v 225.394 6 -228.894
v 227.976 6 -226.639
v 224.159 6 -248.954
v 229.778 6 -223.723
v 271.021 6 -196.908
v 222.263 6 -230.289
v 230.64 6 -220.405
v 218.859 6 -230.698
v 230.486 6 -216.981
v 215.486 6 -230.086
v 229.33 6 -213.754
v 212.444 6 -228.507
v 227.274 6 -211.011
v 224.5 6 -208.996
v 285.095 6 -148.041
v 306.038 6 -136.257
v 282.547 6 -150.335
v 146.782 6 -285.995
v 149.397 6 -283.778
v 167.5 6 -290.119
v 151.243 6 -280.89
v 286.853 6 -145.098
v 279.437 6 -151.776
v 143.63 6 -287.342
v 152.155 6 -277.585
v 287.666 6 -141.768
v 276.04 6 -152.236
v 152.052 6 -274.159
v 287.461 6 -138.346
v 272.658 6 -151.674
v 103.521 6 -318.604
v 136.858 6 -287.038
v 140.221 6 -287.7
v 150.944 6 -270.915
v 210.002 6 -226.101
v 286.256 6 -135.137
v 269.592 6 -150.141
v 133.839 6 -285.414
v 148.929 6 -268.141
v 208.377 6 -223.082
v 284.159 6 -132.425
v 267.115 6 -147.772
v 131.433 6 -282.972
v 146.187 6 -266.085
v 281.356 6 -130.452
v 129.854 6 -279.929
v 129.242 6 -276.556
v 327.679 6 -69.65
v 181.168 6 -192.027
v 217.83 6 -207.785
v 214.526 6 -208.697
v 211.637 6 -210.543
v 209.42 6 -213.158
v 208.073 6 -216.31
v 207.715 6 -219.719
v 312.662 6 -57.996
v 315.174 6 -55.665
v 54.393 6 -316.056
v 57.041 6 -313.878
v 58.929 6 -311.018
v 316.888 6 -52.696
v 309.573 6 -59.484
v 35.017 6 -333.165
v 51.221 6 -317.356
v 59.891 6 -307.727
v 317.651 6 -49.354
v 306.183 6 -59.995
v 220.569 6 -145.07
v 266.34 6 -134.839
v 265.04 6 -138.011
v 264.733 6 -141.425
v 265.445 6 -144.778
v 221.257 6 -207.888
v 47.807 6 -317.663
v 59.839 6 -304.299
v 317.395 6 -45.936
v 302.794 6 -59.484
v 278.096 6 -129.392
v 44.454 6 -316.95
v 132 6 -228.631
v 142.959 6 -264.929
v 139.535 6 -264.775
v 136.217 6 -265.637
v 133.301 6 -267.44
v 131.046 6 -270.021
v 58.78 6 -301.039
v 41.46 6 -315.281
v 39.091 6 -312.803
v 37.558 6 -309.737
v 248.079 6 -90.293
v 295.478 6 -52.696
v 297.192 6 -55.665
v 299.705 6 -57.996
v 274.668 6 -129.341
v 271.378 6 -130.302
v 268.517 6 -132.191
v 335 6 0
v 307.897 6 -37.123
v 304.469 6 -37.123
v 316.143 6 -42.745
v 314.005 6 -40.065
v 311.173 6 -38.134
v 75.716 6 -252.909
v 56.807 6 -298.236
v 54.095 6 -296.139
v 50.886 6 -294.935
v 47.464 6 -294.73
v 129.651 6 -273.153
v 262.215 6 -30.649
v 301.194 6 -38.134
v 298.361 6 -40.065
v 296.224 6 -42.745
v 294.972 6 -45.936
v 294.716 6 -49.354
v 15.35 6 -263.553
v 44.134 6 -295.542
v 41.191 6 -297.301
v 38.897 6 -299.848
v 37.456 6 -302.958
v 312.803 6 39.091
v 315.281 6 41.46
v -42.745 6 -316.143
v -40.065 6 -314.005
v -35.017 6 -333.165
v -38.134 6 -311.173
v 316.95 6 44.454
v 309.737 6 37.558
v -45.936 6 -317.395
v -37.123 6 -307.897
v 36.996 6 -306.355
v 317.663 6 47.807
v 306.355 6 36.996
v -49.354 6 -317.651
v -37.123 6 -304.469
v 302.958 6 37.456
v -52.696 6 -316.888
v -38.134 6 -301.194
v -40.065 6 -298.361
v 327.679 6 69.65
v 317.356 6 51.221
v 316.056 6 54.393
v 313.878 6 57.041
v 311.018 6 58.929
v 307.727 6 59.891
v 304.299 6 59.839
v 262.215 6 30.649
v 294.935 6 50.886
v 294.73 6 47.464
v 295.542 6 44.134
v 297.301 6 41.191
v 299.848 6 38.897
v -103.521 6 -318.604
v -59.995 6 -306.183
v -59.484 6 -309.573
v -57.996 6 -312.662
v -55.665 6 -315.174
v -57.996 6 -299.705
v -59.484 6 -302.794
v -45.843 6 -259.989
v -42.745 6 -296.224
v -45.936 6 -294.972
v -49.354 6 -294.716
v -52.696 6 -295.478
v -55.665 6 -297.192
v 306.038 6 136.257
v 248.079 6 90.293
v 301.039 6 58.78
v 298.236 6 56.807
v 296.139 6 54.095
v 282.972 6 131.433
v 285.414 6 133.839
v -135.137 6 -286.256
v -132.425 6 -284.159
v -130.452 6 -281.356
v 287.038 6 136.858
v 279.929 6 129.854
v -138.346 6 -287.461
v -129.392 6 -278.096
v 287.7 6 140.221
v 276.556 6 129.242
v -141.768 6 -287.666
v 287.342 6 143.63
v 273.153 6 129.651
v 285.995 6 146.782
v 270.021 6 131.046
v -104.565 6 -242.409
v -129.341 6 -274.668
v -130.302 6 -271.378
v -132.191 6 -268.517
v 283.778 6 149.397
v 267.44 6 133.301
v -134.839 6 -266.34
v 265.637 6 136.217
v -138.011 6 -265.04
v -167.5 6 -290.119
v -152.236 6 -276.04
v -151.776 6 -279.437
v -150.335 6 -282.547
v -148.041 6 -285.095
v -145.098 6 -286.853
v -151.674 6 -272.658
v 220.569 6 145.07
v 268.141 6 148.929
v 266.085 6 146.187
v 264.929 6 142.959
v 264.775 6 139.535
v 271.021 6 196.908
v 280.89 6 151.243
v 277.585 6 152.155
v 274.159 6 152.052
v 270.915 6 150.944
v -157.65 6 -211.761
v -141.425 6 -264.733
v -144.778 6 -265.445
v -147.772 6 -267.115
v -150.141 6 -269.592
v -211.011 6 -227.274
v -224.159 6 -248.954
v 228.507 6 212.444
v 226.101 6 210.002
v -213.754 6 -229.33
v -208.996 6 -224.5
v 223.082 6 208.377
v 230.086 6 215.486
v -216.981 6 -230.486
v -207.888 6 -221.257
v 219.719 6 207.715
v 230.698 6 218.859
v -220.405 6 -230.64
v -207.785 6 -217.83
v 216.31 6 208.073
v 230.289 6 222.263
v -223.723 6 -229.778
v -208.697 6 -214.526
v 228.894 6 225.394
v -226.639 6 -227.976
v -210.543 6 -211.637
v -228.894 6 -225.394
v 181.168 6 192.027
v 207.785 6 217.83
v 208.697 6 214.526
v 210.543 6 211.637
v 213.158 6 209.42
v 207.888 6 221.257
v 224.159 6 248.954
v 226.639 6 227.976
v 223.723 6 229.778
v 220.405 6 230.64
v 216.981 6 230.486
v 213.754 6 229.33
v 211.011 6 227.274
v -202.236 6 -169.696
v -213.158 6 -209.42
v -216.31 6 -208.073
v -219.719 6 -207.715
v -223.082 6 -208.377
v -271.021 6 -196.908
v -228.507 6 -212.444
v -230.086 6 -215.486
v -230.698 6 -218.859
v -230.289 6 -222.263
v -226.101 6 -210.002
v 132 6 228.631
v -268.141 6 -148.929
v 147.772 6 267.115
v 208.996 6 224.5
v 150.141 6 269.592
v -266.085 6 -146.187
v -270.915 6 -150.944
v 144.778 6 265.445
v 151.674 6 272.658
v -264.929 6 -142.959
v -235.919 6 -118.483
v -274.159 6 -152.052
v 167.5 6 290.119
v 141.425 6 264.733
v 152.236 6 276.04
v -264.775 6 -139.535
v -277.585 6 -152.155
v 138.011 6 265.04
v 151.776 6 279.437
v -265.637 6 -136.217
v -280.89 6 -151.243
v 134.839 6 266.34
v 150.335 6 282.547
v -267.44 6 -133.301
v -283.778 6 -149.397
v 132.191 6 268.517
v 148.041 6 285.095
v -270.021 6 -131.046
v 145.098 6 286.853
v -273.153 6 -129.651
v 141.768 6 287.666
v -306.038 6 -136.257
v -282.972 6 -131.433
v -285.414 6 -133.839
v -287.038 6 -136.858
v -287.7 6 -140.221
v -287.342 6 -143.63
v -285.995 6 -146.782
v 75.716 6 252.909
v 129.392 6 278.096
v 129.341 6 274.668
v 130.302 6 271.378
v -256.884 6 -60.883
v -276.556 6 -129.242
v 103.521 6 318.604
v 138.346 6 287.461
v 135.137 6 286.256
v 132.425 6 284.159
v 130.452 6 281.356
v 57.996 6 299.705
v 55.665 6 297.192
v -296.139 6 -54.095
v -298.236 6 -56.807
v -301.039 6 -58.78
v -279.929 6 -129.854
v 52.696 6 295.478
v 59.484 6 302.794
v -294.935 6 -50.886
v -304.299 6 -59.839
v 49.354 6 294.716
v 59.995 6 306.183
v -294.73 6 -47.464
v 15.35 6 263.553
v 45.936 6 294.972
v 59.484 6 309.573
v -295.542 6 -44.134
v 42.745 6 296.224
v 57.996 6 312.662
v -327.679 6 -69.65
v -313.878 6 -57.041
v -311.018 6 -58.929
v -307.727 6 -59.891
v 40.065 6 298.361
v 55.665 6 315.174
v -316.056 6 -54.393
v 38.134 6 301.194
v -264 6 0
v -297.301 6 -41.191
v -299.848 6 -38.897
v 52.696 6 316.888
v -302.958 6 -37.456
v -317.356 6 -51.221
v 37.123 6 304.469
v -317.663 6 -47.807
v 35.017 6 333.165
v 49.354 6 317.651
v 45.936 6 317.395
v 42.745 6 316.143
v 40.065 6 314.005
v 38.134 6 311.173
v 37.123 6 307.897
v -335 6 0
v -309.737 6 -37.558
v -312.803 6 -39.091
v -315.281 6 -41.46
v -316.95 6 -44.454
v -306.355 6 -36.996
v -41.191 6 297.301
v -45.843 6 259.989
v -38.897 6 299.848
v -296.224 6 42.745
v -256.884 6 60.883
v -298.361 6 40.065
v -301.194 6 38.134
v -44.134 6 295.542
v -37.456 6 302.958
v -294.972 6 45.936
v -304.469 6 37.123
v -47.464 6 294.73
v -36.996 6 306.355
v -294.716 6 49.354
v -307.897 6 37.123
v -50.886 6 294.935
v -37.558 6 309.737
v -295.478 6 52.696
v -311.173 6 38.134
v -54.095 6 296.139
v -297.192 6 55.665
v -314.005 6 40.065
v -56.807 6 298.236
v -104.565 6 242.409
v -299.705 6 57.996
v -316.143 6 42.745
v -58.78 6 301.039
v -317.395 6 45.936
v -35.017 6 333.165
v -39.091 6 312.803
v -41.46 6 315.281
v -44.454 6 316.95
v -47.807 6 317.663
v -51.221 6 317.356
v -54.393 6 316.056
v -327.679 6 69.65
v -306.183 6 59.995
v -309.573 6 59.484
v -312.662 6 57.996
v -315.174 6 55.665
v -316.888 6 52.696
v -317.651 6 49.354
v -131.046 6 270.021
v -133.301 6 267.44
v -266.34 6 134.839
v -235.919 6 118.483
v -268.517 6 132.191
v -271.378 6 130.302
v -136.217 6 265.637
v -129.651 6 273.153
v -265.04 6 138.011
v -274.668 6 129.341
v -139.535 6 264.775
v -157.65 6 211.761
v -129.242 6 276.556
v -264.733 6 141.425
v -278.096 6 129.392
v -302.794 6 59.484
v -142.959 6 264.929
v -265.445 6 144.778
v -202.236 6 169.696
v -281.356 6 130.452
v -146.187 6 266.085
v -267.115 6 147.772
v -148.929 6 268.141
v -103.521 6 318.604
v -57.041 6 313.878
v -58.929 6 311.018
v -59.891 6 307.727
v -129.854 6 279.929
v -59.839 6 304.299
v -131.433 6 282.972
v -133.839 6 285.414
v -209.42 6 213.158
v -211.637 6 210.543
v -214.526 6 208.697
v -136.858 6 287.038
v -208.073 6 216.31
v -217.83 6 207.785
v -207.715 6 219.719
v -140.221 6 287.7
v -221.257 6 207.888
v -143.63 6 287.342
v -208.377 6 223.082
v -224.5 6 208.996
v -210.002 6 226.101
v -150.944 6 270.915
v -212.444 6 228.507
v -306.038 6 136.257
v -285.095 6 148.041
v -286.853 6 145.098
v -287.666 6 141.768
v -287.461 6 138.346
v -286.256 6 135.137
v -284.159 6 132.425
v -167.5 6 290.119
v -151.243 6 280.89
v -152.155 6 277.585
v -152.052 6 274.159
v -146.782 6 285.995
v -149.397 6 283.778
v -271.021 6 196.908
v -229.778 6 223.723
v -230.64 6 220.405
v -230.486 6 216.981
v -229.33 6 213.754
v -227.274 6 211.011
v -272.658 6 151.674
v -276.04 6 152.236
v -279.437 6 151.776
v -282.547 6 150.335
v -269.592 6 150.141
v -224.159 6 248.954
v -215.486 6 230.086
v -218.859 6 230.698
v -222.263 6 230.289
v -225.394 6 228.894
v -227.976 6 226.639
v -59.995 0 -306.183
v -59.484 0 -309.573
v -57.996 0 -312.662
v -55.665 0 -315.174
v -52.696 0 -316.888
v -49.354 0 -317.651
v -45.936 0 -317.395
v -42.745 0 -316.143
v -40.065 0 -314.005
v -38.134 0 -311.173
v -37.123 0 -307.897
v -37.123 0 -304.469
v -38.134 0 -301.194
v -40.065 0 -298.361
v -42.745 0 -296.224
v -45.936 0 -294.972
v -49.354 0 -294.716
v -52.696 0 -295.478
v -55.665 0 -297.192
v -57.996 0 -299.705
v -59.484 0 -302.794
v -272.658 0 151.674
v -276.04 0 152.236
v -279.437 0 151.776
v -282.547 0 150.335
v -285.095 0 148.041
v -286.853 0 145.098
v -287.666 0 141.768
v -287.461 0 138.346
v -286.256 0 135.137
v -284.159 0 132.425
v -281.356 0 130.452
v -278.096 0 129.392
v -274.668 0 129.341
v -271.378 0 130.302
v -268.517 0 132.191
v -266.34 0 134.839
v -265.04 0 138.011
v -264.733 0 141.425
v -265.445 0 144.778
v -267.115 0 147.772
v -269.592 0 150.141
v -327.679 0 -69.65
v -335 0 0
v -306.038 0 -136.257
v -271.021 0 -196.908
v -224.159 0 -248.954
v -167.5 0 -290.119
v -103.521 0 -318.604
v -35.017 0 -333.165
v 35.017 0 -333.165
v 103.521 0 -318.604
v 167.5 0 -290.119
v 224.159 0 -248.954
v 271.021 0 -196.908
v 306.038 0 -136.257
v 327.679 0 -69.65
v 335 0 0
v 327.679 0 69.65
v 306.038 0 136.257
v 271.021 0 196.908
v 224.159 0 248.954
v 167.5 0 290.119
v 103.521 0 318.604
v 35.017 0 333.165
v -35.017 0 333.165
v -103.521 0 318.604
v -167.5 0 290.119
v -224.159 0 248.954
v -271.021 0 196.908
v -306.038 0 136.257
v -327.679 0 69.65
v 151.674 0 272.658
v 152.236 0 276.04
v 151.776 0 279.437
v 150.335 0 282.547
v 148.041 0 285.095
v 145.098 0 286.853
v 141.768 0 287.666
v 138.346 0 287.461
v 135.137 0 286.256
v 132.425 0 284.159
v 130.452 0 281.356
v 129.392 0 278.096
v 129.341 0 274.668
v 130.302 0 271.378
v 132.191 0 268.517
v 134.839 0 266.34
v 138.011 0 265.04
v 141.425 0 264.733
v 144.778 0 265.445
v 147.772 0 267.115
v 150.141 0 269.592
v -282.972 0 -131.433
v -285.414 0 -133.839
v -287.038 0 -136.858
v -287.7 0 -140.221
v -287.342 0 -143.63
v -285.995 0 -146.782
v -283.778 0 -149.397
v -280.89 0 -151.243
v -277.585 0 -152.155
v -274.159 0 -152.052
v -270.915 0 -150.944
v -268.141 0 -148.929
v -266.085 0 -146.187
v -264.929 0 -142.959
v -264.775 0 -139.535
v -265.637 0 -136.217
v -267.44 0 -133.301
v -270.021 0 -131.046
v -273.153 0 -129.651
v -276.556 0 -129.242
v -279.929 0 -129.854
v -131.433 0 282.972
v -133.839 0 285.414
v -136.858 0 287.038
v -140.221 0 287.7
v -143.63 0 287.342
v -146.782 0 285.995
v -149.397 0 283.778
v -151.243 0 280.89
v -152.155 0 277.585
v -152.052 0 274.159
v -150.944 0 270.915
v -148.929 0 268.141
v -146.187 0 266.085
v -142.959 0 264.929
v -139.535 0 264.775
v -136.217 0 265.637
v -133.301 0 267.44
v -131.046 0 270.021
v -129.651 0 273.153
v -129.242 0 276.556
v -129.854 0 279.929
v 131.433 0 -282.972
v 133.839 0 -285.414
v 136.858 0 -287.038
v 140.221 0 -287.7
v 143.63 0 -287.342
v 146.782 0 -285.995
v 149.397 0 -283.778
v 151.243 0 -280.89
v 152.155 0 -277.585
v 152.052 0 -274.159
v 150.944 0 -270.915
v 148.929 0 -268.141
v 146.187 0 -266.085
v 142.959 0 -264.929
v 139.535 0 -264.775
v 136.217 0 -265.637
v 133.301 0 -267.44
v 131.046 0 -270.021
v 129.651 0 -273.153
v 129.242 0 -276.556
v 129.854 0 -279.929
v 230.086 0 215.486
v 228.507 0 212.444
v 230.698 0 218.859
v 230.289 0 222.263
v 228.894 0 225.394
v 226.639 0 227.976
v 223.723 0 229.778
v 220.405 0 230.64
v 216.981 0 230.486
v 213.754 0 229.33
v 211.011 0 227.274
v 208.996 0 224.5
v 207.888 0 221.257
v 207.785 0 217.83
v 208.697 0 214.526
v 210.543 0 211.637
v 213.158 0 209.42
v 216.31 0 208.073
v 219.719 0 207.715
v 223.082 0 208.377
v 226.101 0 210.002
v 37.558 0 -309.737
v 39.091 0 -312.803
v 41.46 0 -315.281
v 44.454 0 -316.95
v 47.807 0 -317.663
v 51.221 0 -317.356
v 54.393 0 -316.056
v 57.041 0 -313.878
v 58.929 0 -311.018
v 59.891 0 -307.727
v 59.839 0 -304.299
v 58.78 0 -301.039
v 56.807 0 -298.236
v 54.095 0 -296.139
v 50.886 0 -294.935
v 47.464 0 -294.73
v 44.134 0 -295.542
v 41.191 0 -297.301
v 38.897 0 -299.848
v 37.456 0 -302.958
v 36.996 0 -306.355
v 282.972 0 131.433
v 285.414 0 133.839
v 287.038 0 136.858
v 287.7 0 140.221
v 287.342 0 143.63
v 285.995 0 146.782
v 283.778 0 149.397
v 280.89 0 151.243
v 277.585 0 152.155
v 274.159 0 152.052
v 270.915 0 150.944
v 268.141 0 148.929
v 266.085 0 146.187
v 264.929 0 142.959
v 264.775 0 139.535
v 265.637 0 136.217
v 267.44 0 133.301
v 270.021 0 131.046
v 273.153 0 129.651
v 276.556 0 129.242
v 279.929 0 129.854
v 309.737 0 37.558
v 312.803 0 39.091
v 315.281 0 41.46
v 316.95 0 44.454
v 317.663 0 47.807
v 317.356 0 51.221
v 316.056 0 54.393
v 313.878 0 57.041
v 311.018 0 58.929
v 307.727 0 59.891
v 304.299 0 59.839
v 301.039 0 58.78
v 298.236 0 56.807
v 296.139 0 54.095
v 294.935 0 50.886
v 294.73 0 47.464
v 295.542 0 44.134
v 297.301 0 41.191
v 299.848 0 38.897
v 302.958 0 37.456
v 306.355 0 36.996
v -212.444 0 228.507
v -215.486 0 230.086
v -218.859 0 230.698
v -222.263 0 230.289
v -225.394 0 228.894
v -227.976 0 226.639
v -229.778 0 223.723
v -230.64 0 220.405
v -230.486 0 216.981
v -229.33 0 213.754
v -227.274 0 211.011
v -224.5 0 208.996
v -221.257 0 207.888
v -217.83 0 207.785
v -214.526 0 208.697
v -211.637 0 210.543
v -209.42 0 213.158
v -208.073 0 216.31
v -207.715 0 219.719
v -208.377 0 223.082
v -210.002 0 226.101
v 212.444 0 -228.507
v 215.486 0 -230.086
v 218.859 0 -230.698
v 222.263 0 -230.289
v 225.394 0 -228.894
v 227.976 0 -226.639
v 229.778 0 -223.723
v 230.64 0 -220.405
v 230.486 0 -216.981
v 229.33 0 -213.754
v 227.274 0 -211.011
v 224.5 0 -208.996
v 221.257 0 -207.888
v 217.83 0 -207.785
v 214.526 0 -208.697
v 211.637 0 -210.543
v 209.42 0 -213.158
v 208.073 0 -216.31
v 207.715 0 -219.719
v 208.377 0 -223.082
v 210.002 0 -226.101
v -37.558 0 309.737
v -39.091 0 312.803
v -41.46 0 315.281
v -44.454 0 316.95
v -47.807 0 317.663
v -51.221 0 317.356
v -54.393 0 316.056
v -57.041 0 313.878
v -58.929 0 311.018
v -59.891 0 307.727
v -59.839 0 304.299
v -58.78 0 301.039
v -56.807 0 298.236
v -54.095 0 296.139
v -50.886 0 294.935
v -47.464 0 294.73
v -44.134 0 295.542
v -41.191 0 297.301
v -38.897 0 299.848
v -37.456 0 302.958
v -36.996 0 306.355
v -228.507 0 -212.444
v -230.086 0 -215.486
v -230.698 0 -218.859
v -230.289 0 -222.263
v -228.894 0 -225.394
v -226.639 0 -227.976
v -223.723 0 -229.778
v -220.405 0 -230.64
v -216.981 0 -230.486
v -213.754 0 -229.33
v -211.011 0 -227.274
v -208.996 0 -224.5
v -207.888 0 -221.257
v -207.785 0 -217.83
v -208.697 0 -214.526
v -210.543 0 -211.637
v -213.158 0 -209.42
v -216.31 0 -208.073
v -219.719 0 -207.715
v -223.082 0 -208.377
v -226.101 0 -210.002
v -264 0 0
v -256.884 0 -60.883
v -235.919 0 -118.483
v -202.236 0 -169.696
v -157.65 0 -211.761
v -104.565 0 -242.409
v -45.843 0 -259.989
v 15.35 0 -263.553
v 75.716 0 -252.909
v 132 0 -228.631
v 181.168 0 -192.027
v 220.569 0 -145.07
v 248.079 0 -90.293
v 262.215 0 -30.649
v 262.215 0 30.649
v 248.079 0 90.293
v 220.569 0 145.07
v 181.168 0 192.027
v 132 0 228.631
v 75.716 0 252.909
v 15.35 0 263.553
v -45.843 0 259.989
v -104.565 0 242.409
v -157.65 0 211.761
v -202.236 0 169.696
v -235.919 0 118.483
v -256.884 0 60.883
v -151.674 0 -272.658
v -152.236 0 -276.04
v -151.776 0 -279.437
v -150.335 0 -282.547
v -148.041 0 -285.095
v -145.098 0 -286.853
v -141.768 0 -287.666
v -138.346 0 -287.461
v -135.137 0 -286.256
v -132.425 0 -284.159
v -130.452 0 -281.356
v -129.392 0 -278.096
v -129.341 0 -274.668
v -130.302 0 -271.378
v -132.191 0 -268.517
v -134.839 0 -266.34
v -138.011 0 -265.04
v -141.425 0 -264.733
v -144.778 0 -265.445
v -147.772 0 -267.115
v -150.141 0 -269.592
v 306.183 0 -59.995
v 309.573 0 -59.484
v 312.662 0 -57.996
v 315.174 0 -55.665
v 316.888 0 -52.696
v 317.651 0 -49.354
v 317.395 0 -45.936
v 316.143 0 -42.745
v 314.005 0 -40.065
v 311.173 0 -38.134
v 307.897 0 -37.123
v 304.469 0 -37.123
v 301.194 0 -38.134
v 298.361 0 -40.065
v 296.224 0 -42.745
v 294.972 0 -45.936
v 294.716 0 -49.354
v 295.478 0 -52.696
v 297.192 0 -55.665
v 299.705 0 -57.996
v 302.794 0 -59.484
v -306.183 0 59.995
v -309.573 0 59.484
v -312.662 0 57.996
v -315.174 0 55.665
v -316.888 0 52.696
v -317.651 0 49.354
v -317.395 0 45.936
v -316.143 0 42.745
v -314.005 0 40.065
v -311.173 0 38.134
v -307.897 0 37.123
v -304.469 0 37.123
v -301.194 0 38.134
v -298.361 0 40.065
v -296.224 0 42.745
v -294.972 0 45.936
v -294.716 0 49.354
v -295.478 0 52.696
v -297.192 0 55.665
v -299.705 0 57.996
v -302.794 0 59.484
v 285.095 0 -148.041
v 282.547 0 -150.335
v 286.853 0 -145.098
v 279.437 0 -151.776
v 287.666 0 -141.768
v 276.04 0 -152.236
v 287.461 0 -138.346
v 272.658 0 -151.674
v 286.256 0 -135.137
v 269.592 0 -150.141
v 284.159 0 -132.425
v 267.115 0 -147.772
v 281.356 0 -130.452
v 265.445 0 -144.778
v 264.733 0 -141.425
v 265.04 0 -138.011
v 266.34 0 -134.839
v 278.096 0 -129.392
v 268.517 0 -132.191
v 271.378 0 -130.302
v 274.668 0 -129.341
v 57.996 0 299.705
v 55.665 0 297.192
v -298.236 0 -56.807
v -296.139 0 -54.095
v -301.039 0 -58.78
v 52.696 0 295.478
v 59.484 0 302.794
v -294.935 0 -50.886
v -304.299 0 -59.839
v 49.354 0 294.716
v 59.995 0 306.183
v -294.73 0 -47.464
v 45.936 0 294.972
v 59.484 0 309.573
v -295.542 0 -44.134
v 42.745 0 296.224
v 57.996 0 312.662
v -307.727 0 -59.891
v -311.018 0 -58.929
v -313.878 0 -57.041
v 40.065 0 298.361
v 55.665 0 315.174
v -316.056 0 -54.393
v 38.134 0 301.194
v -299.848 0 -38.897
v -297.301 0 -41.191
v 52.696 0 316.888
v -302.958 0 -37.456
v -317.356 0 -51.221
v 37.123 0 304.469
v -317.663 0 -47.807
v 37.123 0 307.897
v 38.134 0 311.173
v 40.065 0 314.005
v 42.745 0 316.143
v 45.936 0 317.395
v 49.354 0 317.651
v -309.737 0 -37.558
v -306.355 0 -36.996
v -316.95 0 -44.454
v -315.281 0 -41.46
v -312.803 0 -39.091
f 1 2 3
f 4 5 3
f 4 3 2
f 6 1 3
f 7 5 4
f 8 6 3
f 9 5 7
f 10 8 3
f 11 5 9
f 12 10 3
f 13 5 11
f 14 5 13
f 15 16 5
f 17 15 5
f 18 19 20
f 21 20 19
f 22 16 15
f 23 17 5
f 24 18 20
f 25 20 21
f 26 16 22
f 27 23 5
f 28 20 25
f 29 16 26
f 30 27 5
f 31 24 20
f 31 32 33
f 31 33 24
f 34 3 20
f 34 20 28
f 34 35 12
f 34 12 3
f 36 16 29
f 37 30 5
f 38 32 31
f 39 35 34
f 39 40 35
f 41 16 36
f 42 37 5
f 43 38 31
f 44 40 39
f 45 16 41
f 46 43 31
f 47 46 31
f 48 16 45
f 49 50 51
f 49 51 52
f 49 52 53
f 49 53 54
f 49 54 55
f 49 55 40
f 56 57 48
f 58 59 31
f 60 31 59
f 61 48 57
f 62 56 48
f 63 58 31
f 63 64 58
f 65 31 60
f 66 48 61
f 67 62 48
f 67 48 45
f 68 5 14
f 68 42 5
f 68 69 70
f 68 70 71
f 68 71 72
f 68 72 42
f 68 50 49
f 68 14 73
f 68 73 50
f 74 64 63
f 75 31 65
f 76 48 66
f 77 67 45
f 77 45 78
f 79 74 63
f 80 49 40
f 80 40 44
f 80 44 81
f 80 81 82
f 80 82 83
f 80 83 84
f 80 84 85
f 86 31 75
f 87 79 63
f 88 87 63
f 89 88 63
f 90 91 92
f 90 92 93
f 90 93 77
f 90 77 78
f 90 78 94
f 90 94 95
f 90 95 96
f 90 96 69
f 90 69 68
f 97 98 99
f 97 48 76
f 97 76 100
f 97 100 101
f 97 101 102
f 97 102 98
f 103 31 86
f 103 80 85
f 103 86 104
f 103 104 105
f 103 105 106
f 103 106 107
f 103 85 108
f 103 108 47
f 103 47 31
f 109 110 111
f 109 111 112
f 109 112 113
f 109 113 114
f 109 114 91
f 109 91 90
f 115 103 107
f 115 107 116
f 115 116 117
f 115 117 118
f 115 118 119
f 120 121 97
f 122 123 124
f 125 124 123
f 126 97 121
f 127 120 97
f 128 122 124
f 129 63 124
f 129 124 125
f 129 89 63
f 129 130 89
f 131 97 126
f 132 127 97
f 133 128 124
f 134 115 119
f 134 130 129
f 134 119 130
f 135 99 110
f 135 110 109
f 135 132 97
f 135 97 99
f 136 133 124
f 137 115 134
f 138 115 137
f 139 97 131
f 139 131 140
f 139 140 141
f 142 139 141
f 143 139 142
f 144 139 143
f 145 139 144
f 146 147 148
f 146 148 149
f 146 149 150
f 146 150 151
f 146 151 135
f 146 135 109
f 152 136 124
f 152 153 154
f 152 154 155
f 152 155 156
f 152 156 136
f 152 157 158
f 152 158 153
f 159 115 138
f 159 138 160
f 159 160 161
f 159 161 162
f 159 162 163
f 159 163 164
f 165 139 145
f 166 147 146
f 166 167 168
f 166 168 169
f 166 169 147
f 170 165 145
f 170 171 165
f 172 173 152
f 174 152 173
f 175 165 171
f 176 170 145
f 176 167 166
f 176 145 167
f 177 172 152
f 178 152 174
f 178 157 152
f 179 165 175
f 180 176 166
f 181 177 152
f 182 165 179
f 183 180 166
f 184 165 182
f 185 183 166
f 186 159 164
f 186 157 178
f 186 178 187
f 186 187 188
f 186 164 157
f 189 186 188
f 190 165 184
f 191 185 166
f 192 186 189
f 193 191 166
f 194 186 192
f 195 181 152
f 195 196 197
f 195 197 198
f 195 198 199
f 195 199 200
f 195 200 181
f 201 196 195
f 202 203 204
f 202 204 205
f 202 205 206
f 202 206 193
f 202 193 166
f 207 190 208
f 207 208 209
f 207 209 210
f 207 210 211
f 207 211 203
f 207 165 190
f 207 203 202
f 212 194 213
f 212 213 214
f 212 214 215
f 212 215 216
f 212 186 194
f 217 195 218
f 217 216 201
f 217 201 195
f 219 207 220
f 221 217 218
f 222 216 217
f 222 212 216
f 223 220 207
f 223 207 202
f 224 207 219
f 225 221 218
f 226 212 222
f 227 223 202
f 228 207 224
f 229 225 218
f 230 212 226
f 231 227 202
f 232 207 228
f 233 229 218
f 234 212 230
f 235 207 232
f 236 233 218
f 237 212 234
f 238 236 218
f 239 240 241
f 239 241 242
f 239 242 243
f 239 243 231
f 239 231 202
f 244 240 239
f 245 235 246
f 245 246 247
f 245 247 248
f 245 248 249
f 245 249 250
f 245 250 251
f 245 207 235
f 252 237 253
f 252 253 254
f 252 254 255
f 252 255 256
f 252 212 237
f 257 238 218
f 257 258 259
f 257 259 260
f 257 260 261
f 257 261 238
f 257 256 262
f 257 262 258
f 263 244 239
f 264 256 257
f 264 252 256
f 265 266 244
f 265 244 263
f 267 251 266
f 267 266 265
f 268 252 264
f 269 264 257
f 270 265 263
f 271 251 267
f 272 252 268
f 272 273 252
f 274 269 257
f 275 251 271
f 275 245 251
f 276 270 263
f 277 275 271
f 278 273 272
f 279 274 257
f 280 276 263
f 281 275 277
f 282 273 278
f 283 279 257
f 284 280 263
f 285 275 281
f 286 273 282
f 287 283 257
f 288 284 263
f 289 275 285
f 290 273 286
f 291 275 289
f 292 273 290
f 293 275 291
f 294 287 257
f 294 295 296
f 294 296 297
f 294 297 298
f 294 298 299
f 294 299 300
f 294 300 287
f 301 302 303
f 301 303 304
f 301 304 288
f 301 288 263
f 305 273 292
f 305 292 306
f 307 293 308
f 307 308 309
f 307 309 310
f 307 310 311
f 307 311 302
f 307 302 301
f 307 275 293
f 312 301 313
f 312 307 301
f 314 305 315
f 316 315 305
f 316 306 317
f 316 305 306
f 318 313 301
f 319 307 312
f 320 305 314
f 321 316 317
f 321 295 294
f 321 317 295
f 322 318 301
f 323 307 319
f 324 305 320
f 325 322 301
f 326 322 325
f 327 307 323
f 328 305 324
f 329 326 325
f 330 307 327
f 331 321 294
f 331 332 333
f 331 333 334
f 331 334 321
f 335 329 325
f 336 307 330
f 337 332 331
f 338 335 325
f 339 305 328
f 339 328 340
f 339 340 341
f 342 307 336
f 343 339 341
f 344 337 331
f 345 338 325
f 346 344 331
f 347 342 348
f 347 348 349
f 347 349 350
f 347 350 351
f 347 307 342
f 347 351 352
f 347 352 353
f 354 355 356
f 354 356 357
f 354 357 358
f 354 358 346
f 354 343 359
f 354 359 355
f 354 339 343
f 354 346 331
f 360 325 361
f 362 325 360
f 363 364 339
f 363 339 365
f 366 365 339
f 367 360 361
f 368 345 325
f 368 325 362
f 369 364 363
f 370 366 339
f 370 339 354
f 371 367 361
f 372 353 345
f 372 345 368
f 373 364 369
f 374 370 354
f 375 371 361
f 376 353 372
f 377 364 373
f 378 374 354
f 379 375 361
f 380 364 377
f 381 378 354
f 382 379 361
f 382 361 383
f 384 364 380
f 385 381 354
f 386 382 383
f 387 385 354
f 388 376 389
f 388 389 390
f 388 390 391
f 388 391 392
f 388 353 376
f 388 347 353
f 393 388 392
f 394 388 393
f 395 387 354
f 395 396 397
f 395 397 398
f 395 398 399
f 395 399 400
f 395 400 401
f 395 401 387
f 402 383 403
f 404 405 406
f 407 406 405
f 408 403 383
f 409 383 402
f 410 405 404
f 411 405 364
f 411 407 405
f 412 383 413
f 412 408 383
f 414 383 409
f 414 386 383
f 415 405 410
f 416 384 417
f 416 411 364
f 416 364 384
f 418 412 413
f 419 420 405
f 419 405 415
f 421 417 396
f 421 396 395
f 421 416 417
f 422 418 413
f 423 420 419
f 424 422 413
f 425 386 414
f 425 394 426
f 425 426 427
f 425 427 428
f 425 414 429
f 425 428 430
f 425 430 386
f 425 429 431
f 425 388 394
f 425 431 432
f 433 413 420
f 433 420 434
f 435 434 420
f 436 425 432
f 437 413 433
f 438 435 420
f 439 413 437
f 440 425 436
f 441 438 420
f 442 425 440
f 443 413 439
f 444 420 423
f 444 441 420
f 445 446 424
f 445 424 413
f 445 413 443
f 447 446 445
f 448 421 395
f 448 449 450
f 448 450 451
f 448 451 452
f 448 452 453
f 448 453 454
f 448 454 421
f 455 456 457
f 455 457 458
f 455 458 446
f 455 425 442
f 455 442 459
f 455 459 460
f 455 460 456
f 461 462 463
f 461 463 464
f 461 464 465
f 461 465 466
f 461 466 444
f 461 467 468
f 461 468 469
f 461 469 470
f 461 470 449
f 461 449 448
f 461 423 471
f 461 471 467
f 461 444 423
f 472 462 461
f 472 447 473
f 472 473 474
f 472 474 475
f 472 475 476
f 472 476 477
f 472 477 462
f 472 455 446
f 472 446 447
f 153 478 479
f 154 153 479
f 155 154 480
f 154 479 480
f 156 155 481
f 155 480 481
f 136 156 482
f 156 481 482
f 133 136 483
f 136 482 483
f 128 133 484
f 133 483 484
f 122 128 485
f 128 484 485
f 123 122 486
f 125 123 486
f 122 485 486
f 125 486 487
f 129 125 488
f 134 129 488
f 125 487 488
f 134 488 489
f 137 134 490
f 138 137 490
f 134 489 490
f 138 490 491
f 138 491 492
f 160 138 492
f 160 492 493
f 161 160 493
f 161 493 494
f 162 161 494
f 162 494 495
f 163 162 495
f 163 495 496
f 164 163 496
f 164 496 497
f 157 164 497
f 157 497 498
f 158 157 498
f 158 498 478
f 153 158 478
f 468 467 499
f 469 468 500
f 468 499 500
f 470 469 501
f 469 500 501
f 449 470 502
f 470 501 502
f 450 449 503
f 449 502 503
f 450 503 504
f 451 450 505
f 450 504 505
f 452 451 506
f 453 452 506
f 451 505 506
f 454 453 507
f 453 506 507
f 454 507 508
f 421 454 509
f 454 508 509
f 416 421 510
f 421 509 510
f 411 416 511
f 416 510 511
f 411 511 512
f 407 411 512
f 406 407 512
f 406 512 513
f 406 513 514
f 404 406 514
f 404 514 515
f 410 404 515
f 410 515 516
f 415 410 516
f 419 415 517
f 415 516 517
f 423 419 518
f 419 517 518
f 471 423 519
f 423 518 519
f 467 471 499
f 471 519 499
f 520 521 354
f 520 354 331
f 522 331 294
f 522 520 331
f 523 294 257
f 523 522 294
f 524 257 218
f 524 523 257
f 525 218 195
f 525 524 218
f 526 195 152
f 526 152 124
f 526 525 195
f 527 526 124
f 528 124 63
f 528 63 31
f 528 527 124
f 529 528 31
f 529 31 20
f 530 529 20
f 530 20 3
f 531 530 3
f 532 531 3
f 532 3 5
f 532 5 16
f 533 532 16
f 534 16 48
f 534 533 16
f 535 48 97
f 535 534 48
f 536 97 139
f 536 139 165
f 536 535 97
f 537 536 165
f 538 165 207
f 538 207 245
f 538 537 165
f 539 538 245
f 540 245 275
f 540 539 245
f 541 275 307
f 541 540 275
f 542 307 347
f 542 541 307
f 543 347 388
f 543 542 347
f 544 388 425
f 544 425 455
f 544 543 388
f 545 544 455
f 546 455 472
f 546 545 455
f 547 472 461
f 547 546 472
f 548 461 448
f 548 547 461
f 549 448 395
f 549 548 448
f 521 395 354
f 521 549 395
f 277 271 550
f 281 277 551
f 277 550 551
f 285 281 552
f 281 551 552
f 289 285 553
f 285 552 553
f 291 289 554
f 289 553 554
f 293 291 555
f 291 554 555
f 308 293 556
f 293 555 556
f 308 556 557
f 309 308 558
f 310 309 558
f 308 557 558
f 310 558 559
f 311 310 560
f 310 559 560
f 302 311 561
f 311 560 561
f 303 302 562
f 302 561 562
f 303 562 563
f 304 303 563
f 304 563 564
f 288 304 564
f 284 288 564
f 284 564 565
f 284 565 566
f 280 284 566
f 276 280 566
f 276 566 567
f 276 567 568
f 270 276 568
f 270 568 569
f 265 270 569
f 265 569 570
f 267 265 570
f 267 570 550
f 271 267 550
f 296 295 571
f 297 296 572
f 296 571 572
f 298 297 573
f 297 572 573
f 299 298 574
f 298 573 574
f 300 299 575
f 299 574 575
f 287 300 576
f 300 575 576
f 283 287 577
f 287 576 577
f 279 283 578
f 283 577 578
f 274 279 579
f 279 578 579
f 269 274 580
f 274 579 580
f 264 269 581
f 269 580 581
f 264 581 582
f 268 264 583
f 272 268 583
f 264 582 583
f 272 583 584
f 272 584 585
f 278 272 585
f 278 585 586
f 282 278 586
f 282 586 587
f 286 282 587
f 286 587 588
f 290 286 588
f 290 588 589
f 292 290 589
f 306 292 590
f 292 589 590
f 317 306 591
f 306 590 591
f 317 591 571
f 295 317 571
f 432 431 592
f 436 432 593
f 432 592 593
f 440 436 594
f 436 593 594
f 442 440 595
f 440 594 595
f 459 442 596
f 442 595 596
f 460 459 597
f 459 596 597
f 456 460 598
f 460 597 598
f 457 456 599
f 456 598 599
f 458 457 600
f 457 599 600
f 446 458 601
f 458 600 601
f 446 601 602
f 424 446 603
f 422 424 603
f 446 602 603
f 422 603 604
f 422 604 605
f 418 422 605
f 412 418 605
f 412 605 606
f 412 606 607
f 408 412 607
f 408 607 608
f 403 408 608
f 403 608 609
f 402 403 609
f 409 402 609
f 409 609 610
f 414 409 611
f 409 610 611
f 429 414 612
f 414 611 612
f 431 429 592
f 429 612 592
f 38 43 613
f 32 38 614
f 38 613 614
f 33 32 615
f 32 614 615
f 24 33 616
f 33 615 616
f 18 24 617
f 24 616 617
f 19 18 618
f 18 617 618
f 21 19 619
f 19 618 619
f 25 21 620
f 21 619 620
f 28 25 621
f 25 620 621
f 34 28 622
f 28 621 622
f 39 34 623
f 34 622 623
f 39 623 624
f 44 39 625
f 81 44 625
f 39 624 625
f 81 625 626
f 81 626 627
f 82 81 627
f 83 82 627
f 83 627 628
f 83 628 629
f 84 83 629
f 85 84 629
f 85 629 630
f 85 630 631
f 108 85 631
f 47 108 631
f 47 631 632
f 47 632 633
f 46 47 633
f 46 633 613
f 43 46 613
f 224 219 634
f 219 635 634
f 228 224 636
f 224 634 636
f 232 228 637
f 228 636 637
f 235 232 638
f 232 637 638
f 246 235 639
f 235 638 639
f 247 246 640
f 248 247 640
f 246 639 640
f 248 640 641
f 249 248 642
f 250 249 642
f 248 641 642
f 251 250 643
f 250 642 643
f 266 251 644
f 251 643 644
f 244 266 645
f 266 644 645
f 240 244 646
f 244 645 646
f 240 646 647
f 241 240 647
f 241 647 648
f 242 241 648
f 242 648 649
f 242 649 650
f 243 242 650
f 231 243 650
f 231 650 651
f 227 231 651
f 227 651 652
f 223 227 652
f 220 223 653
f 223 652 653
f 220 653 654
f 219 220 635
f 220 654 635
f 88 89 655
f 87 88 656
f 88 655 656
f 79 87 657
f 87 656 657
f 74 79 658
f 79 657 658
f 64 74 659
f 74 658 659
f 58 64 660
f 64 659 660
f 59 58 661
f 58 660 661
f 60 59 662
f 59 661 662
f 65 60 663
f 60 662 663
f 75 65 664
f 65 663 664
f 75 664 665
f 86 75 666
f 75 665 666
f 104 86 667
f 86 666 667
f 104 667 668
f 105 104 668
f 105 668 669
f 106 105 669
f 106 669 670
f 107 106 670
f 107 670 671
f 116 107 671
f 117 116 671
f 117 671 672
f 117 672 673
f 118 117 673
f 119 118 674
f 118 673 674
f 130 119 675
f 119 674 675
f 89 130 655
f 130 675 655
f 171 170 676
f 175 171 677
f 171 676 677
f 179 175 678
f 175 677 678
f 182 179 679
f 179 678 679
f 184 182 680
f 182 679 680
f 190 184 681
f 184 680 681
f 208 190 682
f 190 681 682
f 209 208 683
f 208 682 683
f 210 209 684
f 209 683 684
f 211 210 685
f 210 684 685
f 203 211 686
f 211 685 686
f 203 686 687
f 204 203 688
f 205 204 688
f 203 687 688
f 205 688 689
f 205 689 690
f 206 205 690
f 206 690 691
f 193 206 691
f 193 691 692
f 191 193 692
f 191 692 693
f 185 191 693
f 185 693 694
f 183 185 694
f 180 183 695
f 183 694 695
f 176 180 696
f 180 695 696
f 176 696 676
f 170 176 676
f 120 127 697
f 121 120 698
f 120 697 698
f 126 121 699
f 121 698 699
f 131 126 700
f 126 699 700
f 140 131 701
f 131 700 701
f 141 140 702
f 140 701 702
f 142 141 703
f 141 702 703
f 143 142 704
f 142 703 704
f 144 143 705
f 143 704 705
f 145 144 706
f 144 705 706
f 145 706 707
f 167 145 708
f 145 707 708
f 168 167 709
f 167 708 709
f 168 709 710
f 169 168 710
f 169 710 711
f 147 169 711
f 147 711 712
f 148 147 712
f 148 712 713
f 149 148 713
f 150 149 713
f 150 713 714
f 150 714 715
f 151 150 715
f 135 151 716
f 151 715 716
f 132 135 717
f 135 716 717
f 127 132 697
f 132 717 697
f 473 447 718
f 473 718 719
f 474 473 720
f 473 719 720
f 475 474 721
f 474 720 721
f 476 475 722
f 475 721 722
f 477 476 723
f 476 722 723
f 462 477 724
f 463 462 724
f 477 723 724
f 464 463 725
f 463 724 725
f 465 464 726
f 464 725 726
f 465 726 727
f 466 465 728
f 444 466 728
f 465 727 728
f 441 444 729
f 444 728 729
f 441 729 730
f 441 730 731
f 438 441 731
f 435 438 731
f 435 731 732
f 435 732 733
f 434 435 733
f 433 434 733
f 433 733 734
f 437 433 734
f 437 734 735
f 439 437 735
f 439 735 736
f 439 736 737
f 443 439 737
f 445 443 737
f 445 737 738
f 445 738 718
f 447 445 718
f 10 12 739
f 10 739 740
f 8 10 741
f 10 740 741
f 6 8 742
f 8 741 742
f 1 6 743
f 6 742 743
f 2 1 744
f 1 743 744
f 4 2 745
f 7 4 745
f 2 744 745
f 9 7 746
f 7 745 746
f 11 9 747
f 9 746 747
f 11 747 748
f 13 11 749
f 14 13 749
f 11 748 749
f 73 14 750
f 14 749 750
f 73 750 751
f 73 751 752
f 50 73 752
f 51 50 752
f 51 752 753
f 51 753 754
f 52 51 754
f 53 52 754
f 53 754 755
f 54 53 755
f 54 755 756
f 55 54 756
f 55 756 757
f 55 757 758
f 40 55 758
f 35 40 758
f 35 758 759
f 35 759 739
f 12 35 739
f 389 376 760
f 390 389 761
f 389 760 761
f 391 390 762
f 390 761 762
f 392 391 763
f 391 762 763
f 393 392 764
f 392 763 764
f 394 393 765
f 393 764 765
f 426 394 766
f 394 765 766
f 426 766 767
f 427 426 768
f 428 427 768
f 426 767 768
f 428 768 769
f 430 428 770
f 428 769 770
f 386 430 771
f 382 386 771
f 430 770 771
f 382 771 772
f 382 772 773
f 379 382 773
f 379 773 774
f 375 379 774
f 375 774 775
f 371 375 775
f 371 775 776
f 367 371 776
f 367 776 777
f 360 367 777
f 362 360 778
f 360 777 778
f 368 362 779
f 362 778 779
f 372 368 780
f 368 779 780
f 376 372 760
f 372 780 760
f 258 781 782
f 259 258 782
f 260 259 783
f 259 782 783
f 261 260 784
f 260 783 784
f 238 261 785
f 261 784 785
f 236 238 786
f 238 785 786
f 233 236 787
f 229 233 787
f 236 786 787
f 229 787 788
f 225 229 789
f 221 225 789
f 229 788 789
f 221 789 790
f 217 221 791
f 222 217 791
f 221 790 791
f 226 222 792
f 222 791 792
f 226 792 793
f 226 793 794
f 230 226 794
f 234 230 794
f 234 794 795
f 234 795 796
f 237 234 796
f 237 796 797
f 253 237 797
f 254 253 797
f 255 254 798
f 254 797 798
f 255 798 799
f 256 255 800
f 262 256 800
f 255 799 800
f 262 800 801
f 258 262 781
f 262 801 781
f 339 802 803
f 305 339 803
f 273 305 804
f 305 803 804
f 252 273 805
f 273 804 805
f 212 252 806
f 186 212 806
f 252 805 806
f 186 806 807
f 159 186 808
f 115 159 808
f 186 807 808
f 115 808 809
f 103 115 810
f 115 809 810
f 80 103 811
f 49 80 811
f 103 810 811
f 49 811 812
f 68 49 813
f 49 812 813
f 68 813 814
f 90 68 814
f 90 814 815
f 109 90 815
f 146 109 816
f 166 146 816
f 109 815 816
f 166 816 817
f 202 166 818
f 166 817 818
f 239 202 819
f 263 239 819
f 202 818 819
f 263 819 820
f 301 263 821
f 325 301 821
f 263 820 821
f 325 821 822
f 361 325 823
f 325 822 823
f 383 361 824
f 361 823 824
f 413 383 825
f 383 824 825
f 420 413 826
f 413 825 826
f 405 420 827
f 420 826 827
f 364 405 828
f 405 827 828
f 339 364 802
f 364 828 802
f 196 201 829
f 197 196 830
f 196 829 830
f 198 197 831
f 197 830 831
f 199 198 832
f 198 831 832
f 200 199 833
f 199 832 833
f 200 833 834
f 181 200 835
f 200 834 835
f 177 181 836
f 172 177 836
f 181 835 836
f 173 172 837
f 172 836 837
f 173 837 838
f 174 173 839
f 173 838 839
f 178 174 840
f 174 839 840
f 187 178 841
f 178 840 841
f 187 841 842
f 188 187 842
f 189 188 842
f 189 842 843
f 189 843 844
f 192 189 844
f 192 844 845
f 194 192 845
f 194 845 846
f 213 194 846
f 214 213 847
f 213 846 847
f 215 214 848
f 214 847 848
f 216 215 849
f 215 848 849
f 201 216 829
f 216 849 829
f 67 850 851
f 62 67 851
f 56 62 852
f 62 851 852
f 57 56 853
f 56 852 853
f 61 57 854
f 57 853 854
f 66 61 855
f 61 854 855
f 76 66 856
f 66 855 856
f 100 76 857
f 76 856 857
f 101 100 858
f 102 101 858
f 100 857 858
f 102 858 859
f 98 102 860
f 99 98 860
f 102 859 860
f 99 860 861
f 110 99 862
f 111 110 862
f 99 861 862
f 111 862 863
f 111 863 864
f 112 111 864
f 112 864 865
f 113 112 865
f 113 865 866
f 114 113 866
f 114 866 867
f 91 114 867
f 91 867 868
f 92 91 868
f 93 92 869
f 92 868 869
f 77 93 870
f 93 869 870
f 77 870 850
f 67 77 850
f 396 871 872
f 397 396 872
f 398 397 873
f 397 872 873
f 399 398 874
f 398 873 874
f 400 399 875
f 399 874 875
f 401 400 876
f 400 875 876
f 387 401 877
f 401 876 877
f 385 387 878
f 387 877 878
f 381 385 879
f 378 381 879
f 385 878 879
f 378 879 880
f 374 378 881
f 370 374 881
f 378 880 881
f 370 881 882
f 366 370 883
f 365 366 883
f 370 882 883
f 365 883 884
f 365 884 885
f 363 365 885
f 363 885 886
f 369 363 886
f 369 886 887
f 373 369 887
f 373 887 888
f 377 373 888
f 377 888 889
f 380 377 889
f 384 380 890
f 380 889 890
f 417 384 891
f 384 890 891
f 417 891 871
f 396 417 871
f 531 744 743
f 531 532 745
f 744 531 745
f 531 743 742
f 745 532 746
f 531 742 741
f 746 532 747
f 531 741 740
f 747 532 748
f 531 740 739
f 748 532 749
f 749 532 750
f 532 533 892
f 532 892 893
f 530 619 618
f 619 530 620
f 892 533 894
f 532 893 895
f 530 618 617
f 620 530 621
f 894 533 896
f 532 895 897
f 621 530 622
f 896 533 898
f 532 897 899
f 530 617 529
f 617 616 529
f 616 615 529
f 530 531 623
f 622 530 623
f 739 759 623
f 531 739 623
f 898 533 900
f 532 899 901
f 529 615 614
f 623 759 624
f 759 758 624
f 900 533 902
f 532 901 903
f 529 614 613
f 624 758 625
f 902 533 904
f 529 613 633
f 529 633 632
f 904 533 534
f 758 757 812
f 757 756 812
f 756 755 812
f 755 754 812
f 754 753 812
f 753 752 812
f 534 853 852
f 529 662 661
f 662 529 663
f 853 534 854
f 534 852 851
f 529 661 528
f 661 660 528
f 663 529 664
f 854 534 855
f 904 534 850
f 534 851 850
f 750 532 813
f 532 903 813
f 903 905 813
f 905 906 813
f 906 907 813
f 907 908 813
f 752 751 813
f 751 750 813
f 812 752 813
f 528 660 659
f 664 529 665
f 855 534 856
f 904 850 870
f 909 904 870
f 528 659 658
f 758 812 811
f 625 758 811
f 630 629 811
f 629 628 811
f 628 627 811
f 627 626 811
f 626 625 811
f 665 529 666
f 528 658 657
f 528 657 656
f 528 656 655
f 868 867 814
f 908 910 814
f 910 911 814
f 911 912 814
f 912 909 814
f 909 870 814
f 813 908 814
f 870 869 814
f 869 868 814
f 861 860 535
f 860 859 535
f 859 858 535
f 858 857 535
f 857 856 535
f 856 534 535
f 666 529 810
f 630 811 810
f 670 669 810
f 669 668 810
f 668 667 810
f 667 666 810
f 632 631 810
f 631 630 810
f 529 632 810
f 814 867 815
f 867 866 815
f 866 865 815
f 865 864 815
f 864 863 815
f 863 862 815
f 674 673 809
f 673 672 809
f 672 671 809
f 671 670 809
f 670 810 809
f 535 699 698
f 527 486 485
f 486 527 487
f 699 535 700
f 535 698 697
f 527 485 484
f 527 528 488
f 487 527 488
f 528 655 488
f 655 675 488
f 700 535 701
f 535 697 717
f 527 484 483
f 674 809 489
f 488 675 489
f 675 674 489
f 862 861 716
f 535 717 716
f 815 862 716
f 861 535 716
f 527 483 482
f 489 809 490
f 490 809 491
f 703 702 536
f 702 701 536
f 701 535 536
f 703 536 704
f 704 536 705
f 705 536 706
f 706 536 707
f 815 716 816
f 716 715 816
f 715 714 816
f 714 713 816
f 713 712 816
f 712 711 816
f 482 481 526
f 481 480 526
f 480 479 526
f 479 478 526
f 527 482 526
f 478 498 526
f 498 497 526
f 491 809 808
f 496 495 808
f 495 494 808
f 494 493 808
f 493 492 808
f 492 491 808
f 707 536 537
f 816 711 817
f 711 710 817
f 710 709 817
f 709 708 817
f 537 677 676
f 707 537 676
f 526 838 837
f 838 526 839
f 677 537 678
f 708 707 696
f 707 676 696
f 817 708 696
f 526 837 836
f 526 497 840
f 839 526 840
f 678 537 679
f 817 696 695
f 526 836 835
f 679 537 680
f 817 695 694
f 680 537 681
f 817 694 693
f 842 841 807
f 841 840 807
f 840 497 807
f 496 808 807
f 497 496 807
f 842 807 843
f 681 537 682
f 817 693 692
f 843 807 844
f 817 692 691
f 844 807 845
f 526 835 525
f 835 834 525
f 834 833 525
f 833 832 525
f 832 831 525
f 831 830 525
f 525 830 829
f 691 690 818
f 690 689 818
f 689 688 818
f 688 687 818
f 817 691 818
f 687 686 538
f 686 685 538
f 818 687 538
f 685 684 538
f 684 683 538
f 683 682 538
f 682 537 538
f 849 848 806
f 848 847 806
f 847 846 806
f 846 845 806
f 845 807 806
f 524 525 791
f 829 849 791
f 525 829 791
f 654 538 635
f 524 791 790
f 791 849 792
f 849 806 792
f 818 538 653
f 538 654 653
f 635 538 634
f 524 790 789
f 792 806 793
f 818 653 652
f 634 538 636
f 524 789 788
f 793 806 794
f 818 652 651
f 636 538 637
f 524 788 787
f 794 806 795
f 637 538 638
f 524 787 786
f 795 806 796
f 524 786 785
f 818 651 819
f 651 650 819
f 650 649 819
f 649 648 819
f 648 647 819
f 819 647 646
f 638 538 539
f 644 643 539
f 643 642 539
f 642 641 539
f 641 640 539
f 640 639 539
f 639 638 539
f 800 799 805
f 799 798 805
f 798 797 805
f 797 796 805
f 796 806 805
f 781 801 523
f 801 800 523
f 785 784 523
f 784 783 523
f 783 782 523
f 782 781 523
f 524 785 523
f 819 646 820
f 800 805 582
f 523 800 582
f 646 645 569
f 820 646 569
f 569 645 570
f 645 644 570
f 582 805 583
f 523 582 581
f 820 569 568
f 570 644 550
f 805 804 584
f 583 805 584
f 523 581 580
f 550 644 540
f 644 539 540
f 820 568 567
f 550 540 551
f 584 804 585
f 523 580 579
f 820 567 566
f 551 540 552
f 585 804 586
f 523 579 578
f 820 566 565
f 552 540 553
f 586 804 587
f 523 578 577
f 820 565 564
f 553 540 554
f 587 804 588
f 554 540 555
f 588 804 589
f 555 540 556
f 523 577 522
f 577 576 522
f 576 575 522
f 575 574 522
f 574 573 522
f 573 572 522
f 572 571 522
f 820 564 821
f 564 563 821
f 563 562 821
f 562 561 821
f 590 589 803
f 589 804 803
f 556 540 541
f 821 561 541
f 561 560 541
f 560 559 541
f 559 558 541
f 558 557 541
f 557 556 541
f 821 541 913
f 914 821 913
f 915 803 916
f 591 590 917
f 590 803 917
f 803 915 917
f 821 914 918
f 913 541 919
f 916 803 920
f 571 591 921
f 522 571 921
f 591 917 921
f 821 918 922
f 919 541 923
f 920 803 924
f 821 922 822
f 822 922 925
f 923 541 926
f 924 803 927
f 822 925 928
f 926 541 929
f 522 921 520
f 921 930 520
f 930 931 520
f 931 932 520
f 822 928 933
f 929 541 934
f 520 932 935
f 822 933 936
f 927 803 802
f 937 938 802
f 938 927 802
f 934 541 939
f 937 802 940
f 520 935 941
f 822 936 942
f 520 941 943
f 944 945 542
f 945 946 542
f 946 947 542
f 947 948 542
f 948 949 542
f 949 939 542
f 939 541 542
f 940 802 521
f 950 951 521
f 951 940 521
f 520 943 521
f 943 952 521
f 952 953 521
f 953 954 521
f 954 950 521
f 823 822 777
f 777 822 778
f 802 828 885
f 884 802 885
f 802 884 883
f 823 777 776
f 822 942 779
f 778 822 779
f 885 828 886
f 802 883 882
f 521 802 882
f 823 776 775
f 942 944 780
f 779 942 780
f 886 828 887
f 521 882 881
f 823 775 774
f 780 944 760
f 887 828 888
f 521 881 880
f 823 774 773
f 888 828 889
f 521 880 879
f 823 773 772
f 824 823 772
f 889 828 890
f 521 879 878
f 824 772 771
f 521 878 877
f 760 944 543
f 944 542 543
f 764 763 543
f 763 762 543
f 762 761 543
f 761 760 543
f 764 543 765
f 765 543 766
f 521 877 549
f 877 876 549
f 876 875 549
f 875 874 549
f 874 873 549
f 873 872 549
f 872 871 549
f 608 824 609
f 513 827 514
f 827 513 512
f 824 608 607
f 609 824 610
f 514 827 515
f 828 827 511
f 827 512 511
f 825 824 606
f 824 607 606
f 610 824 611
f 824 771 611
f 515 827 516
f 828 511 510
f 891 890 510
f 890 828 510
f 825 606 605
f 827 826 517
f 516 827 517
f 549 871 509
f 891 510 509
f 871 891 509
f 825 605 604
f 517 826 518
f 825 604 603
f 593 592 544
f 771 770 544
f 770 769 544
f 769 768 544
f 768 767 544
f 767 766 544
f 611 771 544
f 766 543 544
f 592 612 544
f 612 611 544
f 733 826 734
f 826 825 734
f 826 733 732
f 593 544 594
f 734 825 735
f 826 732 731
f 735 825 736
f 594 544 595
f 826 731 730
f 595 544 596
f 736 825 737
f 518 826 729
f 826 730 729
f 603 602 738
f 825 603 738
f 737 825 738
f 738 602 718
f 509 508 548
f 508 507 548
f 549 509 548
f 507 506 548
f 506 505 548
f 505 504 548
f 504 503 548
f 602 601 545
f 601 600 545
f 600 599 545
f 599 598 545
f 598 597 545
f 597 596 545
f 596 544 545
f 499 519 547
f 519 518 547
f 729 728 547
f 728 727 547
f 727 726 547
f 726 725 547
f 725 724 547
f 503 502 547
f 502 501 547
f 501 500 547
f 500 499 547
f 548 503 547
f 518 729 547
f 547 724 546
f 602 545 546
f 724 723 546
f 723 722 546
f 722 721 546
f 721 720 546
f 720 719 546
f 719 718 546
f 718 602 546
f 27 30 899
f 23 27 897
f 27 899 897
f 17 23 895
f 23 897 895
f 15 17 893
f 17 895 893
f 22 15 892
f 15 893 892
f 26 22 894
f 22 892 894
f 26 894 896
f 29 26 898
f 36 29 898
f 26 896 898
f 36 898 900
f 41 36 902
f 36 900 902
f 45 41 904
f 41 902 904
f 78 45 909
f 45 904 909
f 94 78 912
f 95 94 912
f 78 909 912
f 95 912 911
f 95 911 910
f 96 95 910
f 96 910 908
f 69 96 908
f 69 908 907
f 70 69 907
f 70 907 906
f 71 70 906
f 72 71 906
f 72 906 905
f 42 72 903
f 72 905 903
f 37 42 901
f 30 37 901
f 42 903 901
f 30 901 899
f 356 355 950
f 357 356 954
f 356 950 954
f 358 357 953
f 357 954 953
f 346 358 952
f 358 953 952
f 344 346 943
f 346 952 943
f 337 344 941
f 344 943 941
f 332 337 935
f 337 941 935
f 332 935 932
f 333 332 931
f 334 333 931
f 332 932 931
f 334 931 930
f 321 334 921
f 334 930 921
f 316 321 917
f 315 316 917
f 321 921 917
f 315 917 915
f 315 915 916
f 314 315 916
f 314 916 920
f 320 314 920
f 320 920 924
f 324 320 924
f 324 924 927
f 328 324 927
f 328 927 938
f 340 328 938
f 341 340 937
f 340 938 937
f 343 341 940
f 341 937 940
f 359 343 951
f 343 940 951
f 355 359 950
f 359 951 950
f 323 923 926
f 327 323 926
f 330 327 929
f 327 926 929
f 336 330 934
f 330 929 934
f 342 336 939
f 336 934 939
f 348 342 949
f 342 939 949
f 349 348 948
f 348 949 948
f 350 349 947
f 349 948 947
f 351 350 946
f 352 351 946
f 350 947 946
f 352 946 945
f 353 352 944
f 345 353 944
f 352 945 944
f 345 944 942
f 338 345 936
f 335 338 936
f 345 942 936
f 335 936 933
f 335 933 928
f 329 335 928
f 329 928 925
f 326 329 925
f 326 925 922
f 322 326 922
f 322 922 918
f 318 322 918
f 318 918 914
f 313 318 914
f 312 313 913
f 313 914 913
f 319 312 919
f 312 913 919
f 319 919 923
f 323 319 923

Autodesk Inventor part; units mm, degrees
ref_plane "YZ Plane" through (0, 0, 0) normal (1, 0, 0) x (0, 1, 0)
ref_plane "XZ Plane" through (0, 0, 0) normal (0, 1, 0) x (-1, 0, 0)
ref_plane "XY Plane" through (0, 0, 0) normal (0, 0, 1) x (1, 0, 0)
sketch "Sketch1" plane through (0, 0, 0) normal (0, 1, 0) x (-1, 0, 0)
  circle A0 centre (0, 0) radius 264
  circle A1 centre (0, 0) radius 335
  line L0 (335, 0) -> (264, 0)
  line L1 (-264, 0) -> (-335, 0)
  line L2 (0, 264) -> (0, 335)
  point P0 (299.5, 0)
  point P1 (-299.5, 0)
  point P2 (0, 299.5)
  dimension "d1" = 670
  dimension "d4" = 528
extrude "Extrusion1" add sketch "Sketch1" along normal blind 6 contours L0 A1 L1 A0 | A0 L2 A1 L0 | A0 L1 A1 L2
sketch "Sketch2" plane through (0, 0, 0) normal (0, -1, 0) x (1, 0, 0)
  circle A0 centre (0, 0) radius 335 projected
  circle A1 centre (0, 0) radius 264 projected
  circle A2 centre (48.4947, 306.1834) radius 11.5
  circle A3 centre (0, 0) radius 264 projected
  line L0 (48.4947, 306.1834) -> (0, 0)
  point P0 (0, 264)
  point P1 (265, 0)
  dimension "d5" = 310
  dimension "d7" = 23
extrude "Cut1" cut sketch "Sketch2" against normal blind 6 contours A2
pattern_circular "Circular Pattern1" count 20 over 360 about axis through (0, 0, 0) along (0, 1, 0) of "Cut1"
equation "\"d9\" = Thickness"
equation "\"BendRadius\" = Thickness"
equation "\"BendReliefWidth\" = Thickness"
equation "\"BendReliefDepth\" = 0.5 * Thickness"
equation "\"CornerReliefSize\" = 4 * Thickness"
equation "\"MinimumRemnant\" = 2 * Thickness"
equation "\"TransitionRadius\" = BendRadius"
equation "\"JacobiRadiusSize\" = BendRadius"
equation "\"GapSize\" = Thickness"
equation "\"d8\" = Thickness"
equation "\"Thickness\" = 6"
properties part number "PNS-712 accses hatch flangeipt" material "Steel"
